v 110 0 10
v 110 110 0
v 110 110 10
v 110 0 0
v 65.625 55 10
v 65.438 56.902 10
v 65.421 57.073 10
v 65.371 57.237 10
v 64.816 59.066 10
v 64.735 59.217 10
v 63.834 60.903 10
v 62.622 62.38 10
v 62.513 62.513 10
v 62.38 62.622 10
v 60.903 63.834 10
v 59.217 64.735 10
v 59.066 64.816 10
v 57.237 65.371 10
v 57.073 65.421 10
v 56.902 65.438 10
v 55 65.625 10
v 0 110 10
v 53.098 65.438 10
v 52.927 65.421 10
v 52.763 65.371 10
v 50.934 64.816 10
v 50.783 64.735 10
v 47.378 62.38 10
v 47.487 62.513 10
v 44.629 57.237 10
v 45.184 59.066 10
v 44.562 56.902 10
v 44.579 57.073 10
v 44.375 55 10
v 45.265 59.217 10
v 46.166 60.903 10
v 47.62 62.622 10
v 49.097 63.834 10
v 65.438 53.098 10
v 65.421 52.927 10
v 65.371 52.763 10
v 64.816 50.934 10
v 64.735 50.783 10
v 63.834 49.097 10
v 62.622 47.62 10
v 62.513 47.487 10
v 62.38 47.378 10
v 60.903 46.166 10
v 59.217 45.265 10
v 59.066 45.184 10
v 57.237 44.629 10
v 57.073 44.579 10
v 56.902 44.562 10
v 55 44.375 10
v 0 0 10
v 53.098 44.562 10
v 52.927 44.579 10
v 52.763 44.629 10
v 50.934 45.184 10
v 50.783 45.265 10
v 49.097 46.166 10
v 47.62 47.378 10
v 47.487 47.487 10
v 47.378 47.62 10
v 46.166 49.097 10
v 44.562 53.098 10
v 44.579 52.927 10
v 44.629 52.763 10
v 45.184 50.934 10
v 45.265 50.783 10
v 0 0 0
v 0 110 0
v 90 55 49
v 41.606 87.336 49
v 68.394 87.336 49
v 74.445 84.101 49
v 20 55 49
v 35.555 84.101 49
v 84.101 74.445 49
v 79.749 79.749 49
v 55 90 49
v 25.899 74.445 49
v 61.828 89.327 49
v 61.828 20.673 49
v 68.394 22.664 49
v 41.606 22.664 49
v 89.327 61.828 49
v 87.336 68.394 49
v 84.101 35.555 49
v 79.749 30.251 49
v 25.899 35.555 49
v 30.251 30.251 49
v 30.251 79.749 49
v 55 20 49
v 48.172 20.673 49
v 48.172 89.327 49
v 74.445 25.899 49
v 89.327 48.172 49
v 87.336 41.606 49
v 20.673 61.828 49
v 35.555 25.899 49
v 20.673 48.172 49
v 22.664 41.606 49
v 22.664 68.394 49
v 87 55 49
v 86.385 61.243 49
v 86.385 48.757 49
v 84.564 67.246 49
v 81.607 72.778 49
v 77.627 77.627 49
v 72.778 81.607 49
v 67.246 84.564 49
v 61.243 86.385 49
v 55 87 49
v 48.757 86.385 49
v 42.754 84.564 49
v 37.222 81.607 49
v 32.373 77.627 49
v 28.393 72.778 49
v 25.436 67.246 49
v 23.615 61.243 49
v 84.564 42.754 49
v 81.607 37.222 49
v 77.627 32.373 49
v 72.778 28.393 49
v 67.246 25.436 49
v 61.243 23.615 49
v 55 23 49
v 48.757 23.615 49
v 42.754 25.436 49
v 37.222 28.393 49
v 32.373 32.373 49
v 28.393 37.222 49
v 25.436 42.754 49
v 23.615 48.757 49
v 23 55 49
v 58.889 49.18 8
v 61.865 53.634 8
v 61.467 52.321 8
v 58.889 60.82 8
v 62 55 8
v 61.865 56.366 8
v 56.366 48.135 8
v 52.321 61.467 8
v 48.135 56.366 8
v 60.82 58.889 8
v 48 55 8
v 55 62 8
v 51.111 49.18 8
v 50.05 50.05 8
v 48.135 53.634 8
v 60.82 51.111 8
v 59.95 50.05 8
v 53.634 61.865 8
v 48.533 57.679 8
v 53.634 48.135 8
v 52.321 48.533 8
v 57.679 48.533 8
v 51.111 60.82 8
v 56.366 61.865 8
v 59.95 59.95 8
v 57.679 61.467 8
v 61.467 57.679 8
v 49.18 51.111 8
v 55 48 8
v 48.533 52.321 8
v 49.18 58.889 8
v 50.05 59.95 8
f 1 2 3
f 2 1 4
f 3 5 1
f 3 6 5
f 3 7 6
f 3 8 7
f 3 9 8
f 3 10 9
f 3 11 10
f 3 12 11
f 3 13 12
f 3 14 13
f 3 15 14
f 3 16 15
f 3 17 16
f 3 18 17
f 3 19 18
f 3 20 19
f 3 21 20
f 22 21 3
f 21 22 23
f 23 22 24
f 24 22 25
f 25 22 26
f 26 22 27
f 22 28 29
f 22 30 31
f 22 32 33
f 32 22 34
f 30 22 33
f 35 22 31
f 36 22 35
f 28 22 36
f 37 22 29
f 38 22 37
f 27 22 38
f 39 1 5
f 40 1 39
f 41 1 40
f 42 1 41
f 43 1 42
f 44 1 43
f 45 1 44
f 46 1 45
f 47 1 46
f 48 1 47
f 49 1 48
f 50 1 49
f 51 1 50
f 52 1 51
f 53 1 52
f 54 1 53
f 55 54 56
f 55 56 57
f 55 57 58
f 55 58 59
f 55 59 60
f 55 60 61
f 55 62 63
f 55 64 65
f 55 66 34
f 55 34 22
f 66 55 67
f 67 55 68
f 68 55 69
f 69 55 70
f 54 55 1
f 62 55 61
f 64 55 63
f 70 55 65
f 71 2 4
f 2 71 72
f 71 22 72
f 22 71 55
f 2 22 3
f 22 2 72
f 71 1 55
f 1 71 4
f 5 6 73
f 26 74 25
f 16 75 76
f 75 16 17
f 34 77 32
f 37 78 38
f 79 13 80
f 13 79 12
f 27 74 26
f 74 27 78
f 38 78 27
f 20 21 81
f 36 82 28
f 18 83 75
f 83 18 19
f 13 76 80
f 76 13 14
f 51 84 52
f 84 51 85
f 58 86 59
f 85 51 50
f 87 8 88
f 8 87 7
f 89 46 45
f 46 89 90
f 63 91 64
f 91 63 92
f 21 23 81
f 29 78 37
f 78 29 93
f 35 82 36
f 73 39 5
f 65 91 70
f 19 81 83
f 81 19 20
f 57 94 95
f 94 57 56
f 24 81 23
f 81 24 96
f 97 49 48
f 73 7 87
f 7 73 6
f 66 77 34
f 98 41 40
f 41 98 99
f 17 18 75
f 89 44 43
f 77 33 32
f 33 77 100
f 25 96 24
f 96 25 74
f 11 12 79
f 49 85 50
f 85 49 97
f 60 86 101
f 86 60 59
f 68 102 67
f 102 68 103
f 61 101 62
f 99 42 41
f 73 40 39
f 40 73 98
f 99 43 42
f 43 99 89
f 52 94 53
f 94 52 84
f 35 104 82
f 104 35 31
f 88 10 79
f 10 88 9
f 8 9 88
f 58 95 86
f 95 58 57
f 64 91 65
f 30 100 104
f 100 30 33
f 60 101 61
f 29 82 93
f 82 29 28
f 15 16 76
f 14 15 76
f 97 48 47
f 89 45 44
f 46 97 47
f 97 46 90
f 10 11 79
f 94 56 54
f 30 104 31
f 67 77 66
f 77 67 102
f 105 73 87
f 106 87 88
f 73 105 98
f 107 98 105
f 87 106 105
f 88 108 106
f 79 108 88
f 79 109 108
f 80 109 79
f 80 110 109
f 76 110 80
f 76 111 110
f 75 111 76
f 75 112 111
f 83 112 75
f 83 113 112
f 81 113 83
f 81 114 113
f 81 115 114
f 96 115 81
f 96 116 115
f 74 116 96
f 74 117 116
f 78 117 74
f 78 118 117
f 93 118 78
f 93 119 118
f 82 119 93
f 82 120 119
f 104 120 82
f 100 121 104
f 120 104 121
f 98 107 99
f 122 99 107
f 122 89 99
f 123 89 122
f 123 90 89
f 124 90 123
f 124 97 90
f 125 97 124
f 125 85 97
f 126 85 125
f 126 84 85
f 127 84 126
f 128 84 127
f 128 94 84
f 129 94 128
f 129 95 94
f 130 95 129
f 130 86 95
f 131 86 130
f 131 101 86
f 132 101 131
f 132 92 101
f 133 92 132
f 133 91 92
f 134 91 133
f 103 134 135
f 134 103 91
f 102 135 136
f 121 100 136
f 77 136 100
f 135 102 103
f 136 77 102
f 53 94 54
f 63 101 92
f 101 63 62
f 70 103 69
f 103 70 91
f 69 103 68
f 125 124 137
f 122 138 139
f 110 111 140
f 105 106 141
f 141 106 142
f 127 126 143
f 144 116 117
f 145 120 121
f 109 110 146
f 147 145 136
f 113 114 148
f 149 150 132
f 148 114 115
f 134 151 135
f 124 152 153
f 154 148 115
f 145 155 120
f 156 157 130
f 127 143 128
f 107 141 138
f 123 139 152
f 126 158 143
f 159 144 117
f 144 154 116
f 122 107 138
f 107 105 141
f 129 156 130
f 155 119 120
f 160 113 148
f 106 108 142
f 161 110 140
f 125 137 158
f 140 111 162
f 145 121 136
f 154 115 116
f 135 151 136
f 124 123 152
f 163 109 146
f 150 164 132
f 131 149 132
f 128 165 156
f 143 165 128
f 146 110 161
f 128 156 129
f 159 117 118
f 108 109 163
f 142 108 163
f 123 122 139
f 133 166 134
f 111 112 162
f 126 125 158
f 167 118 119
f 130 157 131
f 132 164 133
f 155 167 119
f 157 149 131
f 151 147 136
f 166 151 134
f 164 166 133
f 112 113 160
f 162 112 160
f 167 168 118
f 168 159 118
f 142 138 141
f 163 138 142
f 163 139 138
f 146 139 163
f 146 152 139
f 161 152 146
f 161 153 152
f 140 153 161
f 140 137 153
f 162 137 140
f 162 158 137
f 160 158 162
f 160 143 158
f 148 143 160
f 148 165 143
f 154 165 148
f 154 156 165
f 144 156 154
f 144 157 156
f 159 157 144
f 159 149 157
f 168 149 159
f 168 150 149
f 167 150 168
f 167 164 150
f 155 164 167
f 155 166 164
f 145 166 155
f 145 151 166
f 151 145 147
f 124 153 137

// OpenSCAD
$fn = 32;

// ----------------------------------------------------------------------
// Hopper: funnel with square flange
// ----------------------------------------------------------------------

// --- parameters (mm) ---
fl = 110;                 // flange side, X and Y
fl_t = 10;                // flange thickness
cone_h = 40;              // cone height above the flange
top_d = 70;               // cone mouth diameter
bot_d = 20;               // cone spout diameter
wall = 3;                 // cone wall thickness

bore_d = bot_d - 2 * wall;  // spout bore diameter
total_h = fl_t + cone_h - 1;  // overall height

difference() {
  union() {
    cube([fl, fl, fl_t]);
    translate([fl / 2, fl / 2, fl_t - 1])
      cylinder(h = cone_h, d1 = bot_d, d2 = top_d);
  }
  translate([fl / 2, fl / 2, fl_t - 2])
    cylinder(h = cone_h + 1, d1 = bore_d, d2 = top_d - 2 * wall);
}
